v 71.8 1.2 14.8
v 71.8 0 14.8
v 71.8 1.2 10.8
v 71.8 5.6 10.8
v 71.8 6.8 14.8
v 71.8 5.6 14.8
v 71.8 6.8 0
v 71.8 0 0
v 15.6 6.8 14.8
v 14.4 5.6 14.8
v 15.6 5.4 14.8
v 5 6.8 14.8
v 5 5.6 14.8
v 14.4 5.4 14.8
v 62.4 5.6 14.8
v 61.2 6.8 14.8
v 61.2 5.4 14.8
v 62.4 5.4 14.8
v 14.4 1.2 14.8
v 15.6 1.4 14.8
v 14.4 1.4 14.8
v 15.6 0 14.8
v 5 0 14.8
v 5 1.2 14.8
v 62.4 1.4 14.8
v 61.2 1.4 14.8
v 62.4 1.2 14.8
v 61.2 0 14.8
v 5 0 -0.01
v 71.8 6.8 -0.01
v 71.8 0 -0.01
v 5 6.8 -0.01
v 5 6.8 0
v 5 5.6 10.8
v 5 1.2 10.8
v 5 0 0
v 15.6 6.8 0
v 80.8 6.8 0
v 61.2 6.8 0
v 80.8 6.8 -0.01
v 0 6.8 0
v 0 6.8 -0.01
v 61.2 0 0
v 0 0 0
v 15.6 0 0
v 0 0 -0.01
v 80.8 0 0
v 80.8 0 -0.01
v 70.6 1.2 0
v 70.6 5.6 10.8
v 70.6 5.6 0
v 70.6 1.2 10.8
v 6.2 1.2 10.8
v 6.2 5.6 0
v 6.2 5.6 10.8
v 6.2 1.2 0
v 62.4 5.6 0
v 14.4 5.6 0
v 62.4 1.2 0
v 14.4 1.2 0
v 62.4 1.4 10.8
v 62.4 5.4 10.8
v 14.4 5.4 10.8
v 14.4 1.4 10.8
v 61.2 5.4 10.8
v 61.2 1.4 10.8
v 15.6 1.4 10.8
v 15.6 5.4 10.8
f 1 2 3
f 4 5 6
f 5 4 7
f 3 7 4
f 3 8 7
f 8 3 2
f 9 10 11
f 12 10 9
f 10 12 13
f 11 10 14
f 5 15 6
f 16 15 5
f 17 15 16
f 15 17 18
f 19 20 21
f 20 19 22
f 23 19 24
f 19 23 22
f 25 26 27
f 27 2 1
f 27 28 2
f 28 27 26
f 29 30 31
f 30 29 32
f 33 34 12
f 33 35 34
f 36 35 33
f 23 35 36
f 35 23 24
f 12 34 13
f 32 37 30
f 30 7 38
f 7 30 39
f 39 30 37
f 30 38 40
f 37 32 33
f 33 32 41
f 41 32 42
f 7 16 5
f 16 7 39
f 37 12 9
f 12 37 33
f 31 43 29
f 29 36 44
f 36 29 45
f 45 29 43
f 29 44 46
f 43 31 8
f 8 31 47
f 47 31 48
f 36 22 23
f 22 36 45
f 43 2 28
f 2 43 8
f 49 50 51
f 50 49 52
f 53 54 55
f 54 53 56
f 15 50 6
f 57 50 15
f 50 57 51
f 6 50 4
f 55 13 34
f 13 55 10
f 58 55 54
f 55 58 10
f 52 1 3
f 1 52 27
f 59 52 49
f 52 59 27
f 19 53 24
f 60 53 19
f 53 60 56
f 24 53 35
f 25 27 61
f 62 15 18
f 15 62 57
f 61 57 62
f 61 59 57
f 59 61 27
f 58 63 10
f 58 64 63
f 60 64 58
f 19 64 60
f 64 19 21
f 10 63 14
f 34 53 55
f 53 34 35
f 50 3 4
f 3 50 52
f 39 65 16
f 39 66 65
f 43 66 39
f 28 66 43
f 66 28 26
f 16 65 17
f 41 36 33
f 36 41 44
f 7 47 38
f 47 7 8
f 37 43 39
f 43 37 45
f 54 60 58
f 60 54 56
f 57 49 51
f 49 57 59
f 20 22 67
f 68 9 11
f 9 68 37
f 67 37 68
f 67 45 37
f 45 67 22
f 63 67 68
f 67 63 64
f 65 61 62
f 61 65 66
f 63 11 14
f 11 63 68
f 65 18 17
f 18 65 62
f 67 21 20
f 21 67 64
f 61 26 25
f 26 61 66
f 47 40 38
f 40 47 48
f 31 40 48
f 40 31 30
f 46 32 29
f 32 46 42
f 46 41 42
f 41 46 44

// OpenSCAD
// file: ../Base/Boxes.scad
// Fischertechnik Box Foundation
// Pre-designed Boxes

use <Constants.scad>

include <PlacementOptions.scad>

box190Width = 190;
box190Depth = 130;
box130Width = 130;
box130Depth = 95;
boxUsageHeight = 33.9;
boxWallThickness = 2.4;
boxBaseThickness = 1.0;
boxWebWidth = 3.0;

// getBoxWallThickness()
// Gets the wall thickness of a Fischertechnik Box

function getBoxWallThickness() = boxWallThickness;

// Gets the usable height of a fischertechnik box
function getBoxUsageHeight() = boxUsageHeight;

// Gets the thickness of the Fischertechnik box base.
function getBoxBaseThickness() = boxBaseThickness;

// Gets the width of a box web
function getBoxWebWidth() = boxWebWidth;

// Gets the usable inner space of a Box 190 as an x/y-list
function getBox190Space() = [
    box190Width - 2*getBoxWallThickness(), 
    box190Depth - 2*getBoxWallThickness() ];

// Imports the Fischertechnik empty box 130x190 mm and places it at position 0,0
// 190x130 are the outer sizes, the inner space is slightly smaller. Use getBox190Space() to get the inner sizes.
// This module needs the STL file "Fischertechnik Box 130x190.stl" in the library path.
// The box is positioned that the usable inner space is at the 0,0,0 position. The

module Box190() {
    translate([-getBoxWallThickness(),-getBoxWallThickness(),-getBoxBaseThickness()])
        import("Fischertechnik Box 130x190.stl", convexity=3);
}

// Gets the usable inner space of a Box 130 as an x/y-list
function getBox130Space() = [
    box130Width - 2*getBoxWallThickness(), 
    box130Depth - 2*getBoxWallThickness() ];

// Imports the Fischertechnik empty box 95x130 mm and places it at position 0,0
// 190x130 are the outer sizes, the inner space is slightly smaller. Use getBox190Space() to get the inner sizes.
// This module needs the STL file "Fischertechnik Box 95x130.stl" in the library path.
// The box is positioned that the usable inner space is at the 0,0,0 position. The

module Box130() {
    translate([-getBoxWallThickness(),-getBoxWallThickness(),-getBoxBaseThickness()])
        import("Fischertechnik Box 95x130.stl", convexity=3);
}

// Creates a web at the specified box walls
// corner 0 = LowerLeft, 1 = UpperLeft, 2 = UpperRight, 3 = LowerRight
// side 0 = LeftOfCorner, 1 = RightOfCorner
// distance = Distance in mm from the corner
// box = inner width and depth of the box (default: Box 190)
// webWidth = length of the web (default is 3 mms)
// webThickness = thickness of the web (default is 1 mm)

module BoxWeb(corner, side, distance, box=getBox190Space(), webWidth=getBoxWebWidth(), webThickness=1.0) {
    sink = getBoxWallThickness()/2;

    width = (corner % 2 == 0) ? 
            (side == LeftOfCorner ? webWidth : webThickness) :
            (side == LeftOfCorner ? webThickness : webWidth);

    depth = (corner % 2 == 0) ? 
            (side == RightOfCorner ? webWidth : webThickness) :
            (side == RightOfCorner ? webThickness : webWidth);
    
    xDiff = corner == LowerLeft ? 
                (side == LeftOfCorner ? -sink : distance) :
            (corner == UpperLeft ?                
                (side == LeftOfCorner ? distance : -sink) :
            (corner == UpperRight ?
                (side == LeftOfCorner ? box.x-webWidth+sink : box.x-distance-webThickness) :
                (side == LeftOfCorner ? box.x-distance-webThickness: box.x-webWidth+sink)));

    yDiff = corner == LowerLeft ? 
                (side == RightOfCorner ? -sink : distance) :
            (corner == UpperLeft ?
                (side == RightOfCorner ? box.y-distance : box.y-webWidth+sink) :
            (corner == UpperRight ?
                (side == RightOfCorner ? box.y-webWidth+sink : box.y-distance) :
                (side == RightOfCorner ? distance : -sink)));
    
    translate([xDiff, yDiff, -getExcess()])
        cube([width, depth, boxUsageHeight + 2*getExcess()]);
}
// file: ../Base/Rotation.scad
// Fischertechnik Box Foundation
// Geometry Helpers Rotation

include <PlacementOptions.scad>

// getRotatedSpace(space, rotation=NoRotation)
// Rotates the space dependent on the specified rotation

function getRotatedSpace(space, rotation=NoRotation) = [
    (rotation == Rotate90 || rotation == Rotate270) ? space.y : space.x,
    (rotation == Rotate90 || rotation == Rotate270) ? space.x : space.y
];

// Rotates the given space around the fixed left lower corner
// space = the space the children needs as width/depth list [width,depth]
// rotation = 0 Rotate0 degrees, 1 Rotate90 degrees, 2 Rotate180 degrees, 3 Rotate270 degrees (equivalent to -90)

module RotateFix(space, rotation=Rotate0) {
    dy = (rotation == Rotate0 || rotation == Rotate270) ? 0 :
        (rotation == Rotate90) ? space.x :
        space.y;
    dx = (rotation < Rotate180) ? 0 :
        (rotation == Rotate180) ? space.x :
        space.y;
    
    translate([dx, dy, 0])
        rotate([0, 0, rotations[rotation]])
            children();
}
// file: ../Base/Alignment.scad
// Fischertechnik Box Foundation
// Geometry Helpers Alignment

include <PlacementOptions.scad>

// getAlignedX(elementWidth, spaceWidth, align=AlignRight, offset=0)
// Gets the aligned X offset of an element with the given
// width in the given space.
// elementWidth = The width of the element to positon
// spaceWidth = The space where the element should be aligned
// align = 0 AlignLeft, 1 AlignCenter, 2 AlignRight
// offset = an optional offset from the aligned position. When
// aligned left or centered, then positive values are in X direction.
// When aligned right then positive values are in negative X direction.

function getAlignedX(elementWidth, spaceWidth, align=AlignRight, offset=0) =
    (align == AlignLeft) ?
        offset :
        ((align == AlignCenter) ?
        (spaceWidth - elementWidth)/2 + offset :
        spaceWidth - offset - elementWidth);

// getAlignedY(elementDepth, spaceDepth, align=AlignTop, offset=0)
// Gets the aligned Y offset of an element with the given
// depth in the given space.
// elementDepth = The depth of the element to positon
// spaceDepth = The space where the element should be aligned
// align = 0 AlignBottom, 1 AlignCenter, 2 AlignTop
// offset = an optional offset from the aligned position. When
// aligned bottom or centered, then positive values are in Y direction.
// When aligned top then positive values are in negative Y direction.

function getAlignedY(elementDepth, spaceDepth, align=AlignTop, offset=0) =
    (align == AlignBottom) ?
        offset :
        ((align == AlignCenter) ?
        (spaceDepth - elementDepth)/2 + offset :
        spaceDepth - offset - elementDepth);
// file: ../Base/PlacementOptions.scad
// Fischertechnik Box Foundation
// Placement Options

// Alignment
NoAlign = 0;
AlignLeft = 1;
AlignBottom = 2;
AlignCenter = 3;
AlignRight = 4;
AlignTop = 5;

// Element rotation degree steps
rotations = [0, -90, -180, -270];

// Rotation
NoRotation = 0;
Rotate0 = 0;
Rotate90 = 1;
Rotate180 = 2;
Rotate270 = 3;

// Docking (seen from above)
NoDock = -1;
DockLeft = 0;
DockTop = 1;
DockRight = 2;
DockCorner = 2;
DockBottom = 3;

// Web corners
LowerLeft = 0;
UpperLeft = 1;
UpperRight = 2;
LowerRight = 3;

// Web position relative to corner
LeftOfCorner = 0;
RightOfCorner = 1;
// file: ../Base/Placement.scad
// Fischertechnik Box Foundation
// Geometry Helpers Placement

use <Constants.scad>
use <Alignment.scad>
use <Rotation.scad>
use <Boxes.scad>

include <PlacementOptions.scad>

// Place(x=0, y=0, elementSpace=[0,0], alignX=AlignLeft, alignY=AlignBottom, rotation=Rotate0, boxSpace=getBox190Space())
// Places the child at the specified position
// y = Y-Position. This is a relative position when an X aligment is specified.
// x = X-Position. This is a relative position when an Y aligment is specified.
// elementSpace = space of the element to be placed [x,y]
// alignX = -1=NoAlign, 0 AlignLeft, 1 AlignCenter, 3 AlignRight (elementSpace and boxSpace required!)
// alignY = -1=NoAlign, 2 AlignBottom, 1 AlignCenter, 4 AlignTop (elementSpace and boxSpace required!)
// rotation = 0 Rotate0 0 degrees, 1 Rotate90 90 degrees, 
// 2 Rotate180 180 degrees, 3 Rotate270 270 degrees (equivalent to -90)
// boxSpace = Inner space of the box where the placement occurs [x,y] - default is Box 190x130 inner space

module Place(x=0, y=0, elementSpace=[0,0], 
  alignX=AlignLeft, alignY=AlignBottom, 
  rotation=NoRotation, boxSpace=getBox190Space()) {

    module Position(x, y, space, rotation=Rotate0) {
        translate([x, y, 0])
            RotateFix(space, rotation)
                children(0);
    }

    space = getRotatedSpace(elementSpace, rotation);
    alignedX = getAlignedX(space.x, boxSpace.x, alignX, x);
    alignedY = getAlignedY(space.y, boxSpace.y, alignY, y);
    Position(alignedX, alignedY, elementSpace, rotation)
        children();
}

// Center(space=getBox130Space(), elementSpace=[0,0])
// space = Space where the children is centered. For cylinder use centered=true and no elementSpace.
// elementSpace = space of the element to be centered [x,y]

module Center(space=getBox190Space(), elementSpace=[0,0]) {
    translate([(space.x - elementSpace.x) / 2, (space.y - elementSpace.y) / 2])
        children(0);
}

// CenterHorizontal(width=0, y=0, offset=0, space=getBox130Space())
// space = Space where the children is centered. For cylinder use centered=true and no elementSpace.
// elementSpace = space of the element to be centered [x,y]

module CenterHorizontal(width=0, y=0, offset=0, space=getBox190Space()) {
    translate([(space.x - width) / 2 + offset, y])
        children(0);
}

// CenterVertical(depth=0, x=0, offset=0, space=getBox130Space())
// space = Space where the children is centered. For cylinder use centered=true and no elementSpace.
// elementSpace = space of the element to be centered [x,y]

module CenterVertical(depth=0, x=0, offset=0, space=getBox190Space()) {
    translate([x, (space.y - depth) / 2 + offset])
        children(0);
}
// file: ../Base/Constants.scad
// Fischertechnik Box Foundation
// Constants

// Constant values necessary for multiple elements

// Base constants
dividerThickness = 1.2;
excess = 0.01;
fragments = 90;
tolerance = 0.8;

// Gets the thickness of a divider 
function getDividerThickness() = dividerThickness;

// Gets the excess that is used to merge walls into each other
function getExcess() = excess;

// Gets amount of fragments of a cylinder
function getFragments() = fragments;

// Gets the inner tolerance of a frame to each side
function getTolerance() = tolerance;


// Fischertechnik specific constants
axisDiameter = 4;
axisBottomDiameter = axisDiameter + 1;
standardEdgeDistance = 2.5;
standardWebDistance = 11.5;
standardCornerLength = 15;
tubeWallFactor = 1.6;

// Gets axis diameter
function getAxisDiameter() = axisDiameter;

// Gets axis bottom diameter for thicker part at the bottom
function getAxisBottomDiameter() = axisBottomDiameter;

// gets the standard distance to the wall of the box for dockable frames with webs
function getStandardEdgeDistance() = standardEdgeDistance;

// gets the standard distance of each web to the corner of the dockable frame
function getStandardWebDistance() = standardWebDistance;

// gets the standard length of the corner walls of a dockable frame
function getStandardCornerLength() = standardCornerLength;

// gets the wall thickness of a tube.
function getTubeWallThickness() = tubeWallFactor * getDividerThickness();
// main file
// Fischertechnik Box Library
// Frame for bracket with axle 80
// 38201

use <../Base/Constants.scad>
use <../ModelBase/Simple.scad>
use <../ModelBase/Complex.scad>

length = 66;
axisLength = 80;

completeSpace = [
    axisLength + getTolerance(), 
    getFrameAxisSpace(length).y,
    getFrameAxisHeight()];

// getFrameBracketWithAxle80Space()
// Gets the width (.x) and depth (.y) of the axis frame.

function getFrameBracketWithAxle80Space() = completeSpace;

// FrameBracketWithAxle80()
// Axis holder for a single 60 mm axis.

module FrameBracketWithAxle80() {
    Space(completeSpace);
    translate([5, 0])
        FrameAxis(length, true);
}

// Test
color("lightgray")
FrameBracketWithAxle80();
